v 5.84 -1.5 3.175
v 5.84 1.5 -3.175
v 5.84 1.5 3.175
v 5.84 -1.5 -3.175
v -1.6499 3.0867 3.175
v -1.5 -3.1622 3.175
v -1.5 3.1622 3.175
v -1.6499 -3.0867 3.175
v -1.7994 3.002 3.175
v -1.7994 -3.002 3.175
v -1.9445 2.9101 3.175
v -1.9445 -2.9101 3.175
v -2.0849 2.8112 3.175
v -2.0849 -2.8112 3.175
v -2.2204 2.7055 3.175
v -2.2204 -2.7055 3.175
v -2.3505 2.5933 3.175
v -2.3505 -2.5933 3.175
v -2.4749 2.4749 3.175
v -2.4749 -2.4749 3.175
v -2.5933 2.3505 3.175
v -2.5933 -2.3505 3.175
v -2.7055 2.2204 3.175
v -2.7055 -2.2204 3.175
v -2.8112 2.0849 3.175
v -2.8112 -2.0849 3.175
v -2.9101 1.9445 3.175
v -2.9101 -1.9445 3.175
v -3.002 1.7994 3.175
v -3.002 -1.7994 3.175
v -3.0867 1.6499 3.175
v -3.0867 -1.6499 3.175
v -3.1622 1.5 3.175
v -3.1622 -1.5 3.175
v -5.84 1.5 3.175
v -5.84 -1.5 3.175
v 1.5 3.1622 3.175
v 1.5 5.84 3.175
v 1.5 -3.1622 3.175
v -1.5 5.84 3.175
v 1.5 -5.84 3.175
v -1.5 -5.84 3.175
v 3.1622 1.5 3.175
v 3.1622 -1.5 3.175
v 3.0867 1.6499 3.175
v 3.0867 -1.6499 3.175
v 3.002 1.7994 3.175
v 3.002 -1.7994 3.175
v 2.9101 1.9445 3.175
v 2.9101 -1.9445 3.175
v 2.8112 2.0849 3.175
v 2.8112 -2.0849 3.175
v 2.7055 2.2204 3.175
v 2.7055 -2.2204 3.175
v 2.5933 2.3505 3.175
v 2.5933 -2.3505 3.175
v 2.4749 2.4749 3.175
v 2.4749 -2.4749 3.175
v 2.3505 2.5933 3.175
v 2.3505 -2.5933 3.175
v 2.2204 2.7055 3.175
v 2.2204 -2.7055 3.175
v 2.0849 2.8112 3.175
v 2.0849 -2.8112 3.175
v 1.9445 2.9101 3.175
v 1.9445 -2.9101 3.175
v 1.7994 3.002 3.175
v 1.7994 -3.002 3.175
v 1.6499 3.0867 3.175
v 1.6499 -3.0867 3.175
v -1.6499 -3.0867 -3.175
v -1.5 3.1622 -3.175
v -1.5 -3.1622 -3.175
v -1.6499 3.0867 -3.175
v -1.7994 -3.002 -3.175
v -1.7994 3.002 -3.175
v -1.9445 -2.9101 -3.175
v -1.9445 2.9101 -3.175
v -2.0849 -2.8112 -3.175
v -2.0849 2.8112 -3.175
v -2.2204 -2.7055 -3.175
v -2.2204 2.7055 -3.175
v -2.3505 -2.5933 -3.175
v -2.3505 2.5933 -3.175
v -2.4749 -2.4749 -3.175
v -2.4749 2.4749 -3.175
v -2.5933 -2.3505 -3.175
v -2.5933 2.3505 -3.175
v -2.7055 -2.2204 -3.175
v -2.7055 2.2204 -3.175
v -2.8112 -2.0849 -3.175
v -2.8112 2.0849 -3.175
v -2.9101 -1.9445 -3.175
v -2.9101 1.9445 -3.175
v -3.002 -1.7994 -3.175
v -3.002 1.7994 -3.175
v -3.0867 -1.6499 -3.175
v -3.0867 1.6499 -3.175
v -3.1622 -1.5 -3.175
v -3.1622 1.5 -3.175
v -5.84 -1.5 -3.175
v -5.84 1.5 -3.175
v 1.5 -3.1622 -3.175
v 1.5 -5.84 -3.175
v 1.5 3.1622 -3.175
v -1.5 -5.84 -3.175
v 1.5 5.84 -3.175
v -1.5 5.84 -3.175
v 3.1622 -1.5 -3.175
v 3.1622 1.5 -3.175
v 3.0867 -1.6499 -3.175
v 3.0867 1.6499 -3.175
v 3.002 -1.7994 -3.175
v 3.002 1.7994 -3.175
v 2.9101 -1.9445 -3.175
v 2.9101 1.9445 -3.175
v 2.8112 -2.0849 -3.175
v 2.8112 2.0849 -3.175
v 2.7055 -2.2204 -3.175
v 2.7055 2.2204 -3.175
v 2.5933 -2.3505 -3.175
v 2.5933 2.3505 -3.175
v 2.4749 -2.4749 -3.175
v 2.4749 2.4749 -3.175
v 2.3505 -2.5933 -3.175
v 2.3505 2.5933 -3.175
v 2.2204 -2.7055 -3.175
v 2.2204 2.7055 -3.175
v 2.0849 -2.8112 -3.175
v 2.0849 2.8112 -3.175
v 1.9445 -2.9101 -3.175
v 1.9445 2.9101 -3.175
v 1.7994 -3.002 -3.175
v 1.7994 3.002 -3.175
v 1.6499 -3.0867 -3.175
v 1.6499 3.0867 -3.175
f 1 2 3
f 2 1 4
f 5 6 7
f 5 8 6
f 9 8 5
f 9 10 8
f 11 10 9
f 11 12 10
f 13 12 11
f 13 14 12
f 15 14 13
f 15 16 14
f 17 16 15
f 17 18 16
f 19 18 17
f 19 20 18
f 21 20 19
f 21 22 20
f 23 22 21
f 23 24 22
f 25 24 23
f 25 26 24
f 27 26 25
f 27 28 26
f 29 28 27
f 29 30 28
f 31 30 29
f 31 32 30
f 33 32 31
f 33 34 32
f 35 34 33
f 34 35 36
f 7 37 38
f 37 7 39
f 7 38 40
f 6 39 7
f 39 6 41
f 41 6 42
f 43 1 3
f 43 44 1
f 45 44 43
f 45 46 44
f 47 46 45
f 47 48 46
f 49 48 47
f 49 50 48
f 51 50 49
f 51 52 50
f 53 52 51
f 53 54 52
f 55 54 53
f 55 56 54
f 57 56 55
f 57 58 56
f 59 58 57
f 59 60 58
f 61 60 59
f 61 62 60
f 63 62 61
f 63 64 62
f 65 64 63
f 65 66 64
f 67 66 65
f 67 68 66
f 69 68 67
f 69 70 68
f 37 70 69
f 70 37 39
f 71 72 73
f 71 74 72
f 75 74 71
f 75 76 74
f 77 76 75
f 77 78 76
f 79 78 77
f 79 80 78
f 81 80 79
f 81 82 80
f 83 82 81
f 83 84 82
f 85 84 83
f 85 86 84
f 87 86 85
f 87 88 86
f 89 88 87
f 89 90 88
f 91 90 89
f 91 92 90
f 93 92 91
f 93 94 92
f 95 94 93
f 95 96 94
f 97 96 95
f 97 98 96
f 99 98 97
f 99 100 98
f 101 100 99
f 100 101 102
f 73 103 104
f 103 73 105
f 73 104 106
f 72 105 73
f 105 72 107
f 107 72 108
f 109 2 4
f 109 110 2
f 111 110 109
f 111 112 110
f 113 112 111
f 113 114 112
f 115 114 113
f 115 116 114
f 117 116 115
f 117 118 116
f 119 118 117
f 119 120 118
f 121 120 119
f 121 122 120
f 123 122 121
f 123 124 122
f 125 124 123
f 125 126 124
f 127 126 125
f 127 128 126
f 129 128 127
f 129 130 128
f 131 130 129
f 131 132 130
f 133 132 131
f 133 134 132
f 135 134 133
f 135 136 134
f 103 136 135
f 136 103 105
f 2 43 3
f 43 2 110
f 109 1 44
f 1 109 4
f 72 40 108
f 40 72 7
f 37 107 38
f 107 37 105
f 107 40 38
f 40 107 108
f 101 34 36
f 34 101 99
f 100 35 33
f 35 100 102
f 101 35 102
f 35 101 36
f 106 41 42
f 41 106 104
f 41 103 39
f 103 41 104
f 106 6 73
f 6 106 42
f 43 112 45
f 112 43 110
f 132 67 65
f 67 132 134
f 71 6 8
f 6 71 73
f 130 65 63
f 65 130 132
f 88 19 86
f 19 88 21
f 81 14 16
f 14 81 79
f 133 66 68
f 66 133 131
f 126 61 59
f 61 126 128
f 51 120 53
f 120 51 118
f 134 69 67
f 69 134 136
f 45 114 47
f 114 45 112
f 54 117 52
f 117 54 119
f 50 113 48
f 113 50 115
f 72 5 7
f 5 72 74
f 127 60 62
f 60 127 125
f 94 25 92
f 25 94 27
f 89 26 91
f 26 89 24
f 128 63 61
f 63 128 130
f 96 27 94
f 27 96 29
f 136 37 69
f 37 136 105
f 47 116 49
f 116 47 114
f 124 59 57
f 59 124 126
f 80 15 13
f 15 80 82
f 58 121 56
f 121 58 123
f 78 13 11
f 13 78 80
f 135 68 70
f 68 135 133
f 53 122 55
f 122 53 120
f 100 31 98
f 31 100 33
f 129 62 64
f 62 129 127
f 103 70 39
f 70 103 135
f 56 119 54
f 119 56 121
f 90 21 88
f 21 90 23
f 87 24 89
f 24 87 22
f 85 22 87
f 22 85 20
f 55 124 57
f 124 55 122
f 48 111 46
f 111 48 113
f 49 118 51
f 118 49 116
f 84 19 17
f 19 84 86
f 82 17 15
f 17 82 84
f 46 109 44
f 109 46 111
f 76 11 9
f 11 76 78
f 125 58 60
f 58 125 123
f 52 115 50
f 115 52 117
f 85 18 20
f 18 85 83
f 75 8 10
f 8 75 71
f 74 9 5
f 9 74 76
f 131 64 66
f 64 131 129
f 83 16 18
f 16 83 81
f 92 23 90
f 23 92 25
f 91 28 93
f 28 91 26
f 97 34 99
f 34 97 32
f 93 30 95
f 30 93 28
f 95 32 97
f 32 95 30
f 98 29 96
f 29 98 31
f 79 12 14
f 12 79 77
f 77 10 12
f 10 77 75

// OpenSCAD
// Symmetric cross-shaped hub (one connected solid)
// Bounding box target: 11.7 x 11.7 x 6.3 mm

$fn = 128; // smooth circular core (avoid faceted/octagonal look)

// Parameters (mm)
bbox_x = 11.68;
bbox_y = 11.68;
bbox_z = 6.35;

core_d = 7.0;
core_h = bbox_z;

lug_len_radial = (bbox_x - core_d) / 2;   // ensures overall width matches bbox
lug_w_tangential = 3.0;
lug_h = bbox_z;

overlap = 0.6; // overlap into core to guarantee connectivity

module hub() {
    union() {
        // Core cylinder
        cylinder(r = core_d/2, h = core_h, center = true);

        // Four radial lugs at 0/90/180/270 degrees
        for (a = [0:90:270]) {
            rotate([0, 0, a])
                translate([core_d/2 + lug_len_radial/2 - overlap, 0, 0])
                    cube([lug_len_radial + 2*overlap, lug_w_tangential, lug_h], center = true);
        }
    }
}

hub();
